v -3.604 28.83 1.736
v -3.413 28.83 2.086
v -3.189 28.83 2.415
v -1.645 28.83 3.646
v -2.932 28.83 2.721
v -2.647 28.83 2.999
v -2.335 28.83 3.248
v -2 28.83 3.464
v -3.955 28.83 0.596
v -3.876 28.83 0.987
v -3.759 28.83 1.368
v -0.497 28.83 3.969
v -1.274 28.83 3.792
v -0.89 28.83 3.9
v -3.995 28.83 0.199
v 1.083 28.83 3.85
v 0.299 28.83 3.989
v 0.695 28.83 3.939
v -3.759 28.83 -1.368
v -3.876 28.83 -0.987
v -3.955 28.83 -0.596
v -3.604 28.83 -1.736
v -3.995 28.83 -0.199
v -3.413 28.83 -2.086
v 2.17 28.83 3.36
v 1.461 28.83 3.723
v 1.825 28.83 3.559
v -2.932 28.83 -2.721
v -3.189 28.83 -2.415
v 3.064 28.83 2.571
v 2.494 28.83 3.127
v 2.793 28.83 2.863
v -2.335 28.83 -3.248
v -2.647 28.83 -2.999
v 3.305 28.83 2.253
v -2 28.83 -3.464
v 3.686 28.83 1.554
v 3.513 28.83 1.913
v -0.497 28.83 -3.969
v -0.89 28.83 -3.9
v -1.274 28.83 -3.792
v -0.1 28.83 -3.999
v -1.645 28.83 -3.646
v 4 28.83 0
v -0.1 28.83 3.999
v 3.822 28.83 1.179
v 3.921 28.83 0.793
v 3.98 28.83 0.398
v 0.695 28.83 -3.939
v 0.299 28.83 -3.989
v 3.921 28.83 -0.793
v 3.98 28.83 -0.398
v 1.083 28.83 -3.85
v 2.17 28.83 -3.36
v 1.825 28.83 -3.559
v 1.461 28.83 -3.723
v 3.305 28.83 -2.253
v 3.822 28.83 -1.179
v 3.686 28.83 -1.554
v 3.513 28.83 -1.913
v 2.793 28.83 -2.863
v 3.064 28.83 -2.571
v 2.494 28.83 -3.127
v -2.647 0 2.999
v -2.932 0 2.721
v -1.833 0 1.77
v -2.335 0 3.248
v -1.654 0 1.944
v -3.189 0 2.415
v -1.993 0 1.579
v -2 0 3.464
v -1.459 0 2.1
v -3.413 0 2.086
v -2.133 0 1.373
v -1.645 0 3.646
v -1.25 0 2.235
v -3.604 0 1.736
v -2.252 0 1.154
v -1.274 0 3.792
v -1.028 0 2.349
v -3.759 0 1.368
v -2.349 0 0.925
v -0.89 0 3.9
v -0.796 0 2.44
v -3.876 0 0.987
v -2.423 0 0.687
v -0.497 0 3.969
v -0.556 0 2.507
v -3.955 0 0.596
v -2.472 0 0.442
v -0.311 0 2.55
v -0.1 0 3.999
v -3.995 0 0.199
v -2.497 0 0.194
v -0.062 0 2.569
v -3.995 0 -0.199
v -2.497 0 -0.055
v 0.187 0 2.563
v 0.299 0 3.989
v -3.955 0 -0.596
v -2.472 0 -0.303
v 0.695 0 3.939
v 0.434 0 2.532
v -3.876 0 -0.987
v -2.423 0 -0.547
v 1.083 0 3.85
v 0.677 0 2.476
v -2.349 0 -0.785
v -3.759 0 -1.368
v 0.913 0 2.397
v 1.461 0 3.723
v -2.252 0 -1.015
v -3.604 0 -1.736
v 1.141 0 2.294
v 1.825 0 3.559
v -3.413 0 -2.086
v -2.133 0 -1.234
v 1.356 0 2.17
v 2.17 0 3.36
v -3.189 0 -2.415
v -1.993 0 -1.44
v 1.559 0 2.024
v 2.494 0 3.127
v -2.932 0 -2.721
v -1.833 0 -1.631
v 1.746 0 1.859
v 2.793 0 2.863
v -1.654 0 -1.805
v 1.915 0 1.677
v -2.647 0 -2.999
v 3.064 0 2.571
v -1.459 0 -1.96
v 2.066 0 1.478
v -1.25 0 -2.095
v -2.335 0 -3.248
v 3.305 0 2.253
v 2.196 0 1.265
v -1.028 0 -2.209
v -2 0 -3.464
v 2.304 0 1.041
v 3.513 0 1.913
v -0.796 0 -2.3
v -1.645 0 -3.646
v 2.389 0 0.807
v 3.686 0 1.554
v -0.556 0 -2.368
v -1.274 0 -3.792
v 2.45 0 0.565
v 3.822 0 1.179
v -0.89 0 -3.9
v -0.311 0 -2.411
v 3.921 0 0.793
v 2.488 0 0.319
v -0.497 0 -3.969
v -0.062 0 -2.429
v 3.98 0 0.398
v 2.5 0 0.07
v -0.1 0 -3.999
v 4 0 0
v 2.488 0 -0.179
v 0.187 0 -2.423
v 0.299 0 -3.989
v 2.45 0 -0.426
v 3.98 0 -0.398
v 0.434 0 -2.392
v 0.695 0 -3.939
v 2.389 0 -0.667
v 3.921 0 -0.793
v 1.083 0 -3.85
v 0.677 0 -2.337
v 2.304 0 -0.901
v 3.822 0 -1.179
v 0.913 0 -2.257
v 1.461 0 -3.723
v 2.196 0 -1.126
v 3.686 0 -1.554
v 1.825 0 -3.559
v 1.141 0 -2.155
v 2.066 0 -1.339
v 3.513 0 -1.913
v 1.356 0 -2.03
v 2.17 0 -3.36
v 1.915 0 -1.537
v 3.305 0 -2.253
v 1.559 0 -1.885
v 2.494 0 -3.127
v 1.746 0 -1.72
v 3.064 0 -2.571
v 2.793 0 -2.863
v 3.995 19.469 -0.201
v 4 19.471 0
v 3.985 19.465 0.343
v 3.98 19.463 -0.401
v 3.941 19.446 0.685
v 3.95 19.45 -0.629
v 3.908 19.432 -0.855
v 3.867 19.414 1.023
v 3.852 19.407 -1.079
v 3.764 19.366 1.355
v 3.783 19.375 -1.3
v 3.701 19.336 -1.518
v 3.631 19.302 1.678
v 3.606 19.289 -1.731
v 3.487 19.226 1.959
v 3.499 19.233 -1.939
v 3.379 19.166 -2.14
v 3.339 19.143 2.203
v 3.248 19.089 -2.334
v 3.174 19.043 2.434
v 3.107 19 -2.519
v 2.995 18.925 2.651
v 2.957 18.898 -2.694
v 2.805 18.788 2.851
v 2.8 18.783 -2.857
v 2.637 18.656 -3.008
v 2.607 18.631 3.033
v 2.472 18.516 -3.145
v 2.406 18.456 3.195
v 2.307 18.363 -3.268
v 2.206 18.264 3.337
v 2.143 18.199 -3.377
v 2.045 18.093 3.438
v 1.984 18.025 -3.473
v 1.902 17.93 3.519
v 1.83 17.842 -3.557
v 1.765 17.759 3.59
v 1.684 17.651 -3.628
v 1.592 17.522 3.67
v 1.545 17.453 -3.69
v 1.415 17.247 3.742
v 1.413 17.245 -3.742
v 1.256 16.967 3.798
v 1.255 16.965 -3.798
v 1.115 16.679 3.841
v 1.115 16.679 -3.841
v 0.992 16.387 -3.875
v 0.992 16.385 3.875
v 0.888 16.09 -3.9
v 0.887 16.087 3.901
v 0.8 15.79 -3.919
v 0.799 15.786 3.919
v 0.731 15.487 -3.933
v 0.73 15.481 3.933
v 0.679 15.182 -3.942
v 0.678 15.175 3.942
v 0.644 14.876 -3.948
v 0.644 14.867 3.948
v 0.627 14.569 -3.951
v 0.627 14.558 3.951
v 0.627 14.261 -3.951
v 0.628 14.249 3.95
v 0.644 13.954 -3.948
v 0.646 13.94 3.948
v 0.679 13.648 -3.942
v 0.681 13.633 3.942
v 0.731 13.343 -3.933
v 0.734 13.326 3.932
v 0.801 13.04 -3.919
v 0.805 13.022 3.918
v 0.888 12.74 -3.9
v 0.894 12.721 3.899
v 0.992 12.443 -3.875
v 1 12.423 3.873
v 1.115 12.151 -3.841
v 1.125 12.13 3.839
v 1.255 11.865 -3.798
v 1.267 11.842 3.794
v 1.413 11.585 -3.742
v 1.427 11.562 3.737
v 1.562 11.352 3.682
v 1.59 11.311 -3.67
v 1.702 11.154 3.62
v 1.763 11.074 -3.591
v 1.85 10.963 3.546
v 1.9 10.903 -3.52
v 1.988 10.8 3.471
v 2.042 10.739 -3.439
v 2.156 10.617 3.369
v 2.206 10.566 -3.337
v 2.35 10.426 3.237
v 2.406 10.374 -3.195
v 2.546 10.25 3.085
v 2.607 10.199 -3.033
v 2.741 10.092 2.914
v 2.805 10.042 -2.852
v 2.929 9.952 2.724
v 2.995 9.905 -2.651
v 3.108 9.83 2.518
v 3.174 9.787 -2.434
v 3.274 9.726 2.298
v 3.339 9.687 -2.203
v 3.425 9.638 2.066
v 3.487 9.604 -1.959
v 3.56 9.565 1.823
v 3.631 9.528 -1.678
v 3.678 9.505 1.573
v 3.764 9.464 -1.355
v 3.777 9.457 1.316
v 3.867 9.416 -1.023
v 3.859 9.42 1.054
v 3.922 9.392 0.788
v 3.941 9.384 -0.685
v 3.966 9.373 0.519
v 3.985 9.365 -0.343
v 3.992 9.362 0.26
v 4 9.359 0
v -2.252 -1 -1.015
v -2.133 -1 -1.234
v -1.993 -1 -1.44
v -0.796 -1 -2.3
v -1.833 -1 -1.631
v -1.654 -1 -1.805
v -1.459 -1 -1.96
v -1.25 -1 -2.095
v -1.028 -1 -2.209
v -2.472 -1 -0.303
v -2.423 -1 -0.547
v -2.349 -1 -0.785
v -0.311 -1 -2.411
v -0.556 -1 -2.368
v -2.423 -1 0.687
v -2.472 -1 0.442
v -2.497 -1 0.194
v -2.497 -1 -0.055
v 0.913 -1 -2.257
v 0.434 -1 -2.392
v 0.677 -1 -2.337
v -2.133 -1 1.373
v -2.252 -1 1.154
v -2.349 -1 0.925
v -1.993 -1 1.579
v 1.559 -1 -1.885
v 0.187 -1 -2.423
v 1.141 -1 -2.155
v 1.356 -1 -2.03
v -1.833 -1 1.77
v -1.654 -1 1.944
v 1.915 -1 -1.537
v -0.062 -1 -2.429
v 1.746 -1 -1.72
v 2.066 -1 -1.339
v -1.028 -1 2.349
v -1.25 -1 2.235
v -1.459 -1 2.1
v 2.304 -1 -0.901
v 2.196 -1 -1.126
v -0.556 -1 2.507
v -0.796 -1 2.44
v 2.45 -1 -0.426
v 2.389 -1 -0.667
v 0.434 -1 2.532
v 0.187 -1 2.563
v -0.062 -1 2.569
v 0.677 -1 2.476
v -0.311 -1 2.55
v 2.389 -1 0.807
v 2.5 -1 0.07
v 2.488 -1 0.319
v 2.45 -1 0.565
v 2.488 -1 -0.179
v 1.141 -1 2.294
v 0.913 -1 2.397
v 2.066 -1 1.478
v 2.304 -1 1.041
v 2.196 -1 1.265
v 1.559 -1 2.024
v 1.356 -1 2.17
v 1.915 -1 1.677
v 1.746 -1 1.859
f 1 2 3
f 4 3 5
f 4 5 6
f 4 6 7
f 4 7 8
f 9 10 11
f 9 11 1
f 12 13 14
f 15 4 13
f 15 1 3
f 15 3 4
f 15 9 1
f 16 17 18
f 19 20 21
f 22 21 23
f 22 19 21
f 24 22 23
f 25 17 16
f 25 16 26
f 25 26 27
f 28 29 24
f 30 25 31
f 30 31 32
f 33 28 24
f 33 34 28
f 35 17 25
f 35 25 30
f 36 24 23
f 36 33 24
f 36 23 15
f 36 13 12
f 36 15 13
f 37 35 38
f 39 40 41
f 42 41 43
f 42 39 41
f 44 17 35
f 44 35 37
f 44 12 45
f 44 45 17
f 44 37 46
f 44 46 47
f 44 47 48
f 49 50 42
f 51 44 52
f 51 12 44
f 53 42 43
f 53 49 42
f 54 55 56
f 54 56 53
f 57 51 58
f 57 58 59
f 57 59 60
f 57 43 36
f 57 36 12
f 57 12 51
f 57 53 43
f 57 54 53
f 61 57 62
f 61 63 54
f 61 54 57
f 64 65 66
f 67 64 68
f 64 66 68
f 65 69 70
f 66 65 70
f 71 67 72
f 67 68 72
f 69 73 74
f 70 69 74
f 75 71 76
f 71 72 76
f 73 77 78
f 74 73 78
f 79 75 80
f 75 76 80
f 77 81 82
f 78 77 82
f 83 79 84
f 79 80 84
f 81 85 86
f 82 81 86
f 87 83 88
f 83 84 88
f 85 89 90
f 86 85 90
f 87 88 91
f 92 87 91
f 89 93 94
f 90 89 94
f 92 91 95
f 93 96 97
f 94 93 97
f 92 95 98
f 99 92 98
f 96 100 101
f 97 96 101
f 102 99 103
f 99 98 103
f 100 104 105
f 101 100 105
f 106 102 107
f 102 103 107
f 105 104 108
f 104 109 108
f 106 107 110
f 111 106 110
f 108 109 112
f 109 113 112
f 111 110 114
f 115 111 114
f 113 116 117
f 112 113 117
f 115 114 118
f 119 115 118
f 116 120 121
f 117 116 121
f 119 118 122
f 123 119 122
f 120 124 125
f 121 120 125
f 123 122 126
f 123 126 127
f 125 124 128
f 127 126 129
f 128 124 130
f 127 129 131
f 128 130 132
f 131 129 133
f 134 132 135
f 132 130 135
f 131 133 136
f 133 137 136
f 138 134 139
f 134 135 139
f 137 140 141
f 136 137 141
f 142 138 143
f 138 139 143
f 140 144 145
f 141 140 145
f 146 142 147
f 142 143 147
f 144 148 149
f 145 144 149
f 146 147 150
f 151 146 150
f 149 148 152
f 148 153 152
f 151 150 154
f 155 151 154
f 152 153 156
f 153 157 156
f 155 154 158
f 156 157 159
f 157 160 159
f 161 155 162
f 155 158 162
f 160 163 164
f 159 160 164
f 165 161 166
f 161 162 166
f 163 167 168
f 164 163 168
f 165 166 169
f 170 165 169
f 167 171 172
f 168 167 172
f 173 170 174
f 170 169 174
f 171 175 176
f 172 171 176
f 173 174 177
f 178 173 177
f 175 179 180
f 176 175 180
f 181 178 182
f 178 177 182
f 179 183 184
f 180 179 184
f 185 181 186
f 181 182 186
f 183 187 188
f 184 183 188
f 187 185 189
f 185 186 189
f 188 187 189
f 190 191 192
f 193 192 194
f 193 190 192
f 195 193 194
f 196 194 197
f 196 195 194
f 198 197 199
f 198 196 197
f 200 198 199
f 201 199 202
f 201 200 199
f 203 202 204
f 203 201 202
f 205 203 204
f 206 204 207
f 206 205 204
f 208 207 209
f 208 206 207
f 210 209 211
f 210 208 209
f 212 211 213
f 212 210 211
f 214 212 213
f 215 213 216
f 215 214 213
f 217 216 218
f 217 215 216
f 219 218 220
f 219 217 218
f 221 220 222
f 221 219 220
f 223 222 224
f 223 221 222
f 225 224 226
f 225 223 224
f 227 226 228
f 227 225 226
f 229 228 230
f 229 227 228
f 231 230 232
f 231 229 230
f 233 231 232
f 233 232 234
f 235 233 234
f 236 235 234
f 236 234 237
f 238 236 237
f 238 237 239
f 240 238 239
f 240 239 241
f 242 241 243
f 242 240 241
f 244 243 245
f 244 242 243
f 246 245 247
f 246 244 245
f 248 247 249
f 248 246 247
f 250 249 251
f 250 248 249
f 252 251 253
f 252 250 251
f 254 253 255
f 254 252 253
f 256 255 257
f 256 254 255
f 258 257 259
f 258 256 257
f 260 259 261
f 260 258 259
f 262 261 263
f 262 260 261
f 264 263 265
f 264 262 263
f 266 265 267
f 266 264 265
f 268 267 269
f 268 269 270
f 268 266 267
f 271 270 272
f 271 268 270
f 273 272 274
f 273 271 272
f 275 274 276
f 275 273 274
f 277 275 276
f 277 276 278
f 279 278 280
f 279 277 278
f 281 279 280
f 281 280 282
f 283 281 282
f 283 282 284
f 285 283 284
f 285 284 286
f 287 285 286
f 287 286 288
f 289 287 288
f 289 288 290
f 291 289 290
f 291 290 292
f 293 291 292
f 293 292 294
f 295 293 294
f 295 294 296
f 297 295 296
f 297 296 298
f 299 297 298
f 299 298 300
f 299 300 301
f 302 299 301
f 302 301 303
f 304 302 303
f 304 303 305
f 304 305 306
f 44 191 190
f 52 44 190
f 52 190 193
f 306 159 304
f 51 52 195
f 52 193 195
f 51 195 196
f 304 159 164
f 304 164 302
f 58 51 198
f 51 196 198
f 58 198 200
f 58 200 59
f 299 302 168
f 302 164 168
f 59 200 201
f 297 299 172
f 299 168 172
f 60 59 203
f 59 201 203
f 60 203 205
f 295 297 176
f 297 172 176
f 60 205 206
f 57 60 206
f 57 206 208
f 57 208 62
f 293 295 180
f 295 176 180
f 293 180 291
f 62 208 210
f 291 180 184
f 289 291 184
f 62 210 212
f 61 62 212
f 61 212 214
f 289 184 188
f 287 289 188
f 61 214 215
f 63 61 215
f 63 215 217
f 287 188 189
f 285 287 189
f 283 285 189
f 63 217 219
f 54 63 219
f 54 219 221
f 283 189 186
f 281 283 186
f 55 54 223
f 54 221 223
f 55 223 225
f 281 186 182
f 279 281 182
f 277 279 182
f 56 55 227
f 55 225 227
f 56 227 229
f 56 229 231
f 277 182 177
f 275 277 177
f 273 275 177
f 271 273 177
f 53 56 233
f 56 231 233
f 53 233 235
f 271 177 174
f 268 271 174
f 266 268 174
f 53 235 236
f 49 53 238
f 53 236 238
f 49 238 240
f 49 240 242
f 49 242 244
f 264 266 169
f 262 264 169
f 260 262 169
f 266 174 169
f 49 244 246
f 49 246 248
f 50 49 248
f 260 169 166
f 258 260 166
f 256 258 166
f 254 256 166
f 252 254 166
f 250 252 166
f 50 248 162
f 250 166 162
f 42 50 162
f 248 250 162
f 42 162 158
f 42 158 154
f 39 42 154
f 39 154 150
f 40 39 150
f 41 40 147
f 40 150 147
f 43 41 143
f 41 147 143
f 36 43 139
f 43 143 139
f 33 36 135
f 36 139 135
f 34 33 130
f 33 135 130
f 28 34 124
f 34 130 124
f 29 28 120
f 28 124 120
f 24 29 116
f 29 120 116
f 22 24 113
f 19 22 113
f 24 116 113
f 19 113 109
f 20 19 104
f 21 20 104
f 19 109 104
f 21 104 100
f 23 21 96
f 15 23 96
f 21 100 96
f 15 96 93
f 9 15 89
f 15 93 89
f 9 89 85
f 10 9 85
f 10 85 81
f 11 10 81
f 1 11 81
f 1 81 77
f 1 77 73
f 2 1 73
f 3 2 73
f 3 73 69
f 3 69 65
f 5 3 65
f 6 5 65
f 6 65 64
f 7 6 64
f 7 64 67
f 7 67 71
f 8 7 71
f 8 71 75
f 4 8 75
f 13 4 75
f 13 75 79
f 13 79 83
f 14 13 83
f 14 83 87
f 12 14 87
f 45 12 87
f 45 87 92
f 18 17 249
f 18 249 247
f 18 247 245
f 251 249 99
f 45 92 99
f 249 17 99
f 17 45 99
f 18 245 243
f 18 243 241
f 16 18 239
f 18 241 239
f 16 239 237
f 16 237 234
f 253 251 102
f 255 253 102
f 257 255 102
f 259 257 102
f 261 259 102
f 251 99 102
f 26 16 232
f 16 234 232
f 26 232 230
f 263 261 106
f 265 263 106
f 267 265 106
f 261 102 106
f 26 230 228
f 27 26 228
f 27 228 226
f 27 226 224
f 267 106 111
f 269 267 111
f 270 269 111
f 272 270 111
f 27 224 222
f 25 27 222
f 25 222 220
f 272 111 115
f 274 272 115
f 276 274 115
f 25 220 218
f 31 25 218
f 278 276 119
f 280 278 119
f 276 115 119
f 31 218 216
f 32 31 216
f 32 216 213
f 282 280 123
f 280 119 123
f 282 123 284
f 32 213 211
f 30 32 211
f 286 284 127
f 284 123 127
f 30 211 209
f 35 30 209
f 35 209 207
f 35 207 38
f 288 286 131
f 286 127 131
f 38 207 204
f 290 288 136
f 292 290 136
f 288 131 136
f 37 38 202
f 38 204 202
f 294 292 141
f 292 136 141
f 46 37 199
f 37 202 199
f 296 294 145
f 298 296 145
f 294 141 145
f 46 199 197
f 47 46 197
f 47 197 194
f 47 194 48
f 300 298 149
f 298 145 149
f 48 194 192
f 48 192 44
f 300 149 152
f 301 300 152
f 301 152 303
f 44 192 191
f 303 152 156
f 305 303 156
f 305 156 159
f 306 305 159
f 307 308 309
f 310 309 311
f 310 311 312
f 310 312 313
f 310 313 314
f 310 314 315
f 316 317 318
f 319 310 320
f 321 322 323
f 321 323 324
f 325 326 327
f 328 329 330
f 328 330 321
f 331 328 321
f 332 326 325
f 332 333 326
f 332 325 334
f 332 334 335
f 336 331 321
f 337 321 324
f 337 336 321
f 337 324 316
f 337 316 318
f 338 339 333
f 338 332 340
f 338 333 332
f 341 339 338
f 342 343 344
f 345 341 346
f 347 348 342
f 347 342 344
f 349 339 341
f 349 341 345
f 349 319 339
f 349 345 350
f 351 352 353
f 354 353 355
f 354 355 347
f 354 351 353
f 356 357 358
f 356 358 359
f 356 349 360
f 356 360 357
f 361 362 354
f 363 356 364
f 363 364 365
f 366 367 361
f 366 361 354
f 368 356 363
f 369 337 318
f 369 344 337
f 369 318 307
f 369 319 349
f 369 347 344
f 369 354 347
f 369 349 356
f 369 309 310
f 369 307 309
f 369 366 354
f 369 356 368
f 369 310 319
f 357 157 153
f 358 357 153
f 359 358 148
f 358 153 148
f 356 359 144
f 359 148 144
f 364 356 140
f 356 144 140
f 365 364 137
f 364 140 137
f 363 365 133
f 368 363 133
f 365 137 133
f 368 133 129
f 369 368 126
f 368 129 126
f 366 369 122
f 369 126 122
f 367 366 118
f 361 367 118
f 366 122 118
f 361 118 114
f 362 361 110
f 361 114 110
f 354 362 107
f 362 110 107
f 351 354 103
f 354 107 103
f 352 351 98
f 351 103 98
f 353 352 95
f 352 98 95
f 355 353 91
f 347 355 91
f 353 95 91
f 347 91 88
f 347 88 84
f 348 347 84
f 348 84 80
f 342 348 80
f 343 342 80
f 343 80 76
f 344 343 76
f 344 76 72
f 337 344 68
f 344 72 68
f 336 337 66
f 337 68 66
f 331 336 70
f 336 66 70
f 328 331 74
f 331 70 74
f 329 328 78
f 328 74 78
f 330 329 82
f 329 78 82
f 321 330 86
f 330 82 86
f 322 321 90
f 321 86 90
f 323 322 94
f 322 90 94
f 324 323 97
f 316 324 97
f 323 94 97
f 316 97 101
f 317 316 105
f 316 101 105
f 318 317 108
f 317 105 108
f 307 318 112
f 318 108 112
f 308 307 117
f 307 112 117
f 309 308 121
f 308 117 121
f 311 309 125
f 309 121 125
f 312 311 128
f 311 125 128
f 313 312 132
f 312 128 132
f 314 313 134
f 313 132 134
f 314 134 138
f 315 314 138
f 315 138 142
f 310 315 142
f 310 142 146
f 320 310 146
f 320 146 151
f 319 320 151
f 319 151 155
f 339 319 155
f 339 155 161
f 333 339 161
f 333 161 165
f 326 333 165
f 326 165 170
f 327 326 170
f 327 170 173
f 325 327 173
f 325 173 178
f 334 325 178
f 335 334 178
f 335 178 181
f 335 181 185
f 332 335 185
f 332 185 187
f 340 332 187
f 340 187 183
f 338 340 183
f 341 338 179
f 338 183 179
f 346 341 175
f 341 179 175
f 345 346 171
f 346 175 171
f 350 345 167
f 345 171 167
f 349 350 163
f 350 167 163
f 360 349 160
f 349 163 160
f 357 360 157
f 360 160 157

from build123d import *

# Parameters (mm, degrees)
SKETCH1_R               = 4
BOSS_EXTRUDE1_DEPTH     = 28.83
SKETCH2_R               = 5.475
CUT_EXTRUDE1_DEPTH      = 5
CUT_EXTRUDE1_DEPTH_BACK = 5
SKETCH3_R               = 2.5
BOSS_EXTRUDE2_DEPTH     = 1


with BuildPart() as part:
    # Sketch1 → Boss-Extrude1 (new body)
    with BuildSketch(Plane(origin=(0, 0, 0), x_dir=(1, 0, 0), z_dir=(0, 1, 0))):
        Circle(SKETCH1_R)
    extrude(amount=BOSS_EXTRUDE1_DEPTH)

    # Sketch2 → Cut-Extrude1 (cut, two sides)
    with BuildSketch(Plane.XY) as cut_extrude1_sk:
        with Locations((6.1, 14.415)):
            Circle(SKETCH2_R)
    extrude(amount=CUT_EXTRUDE1_DEPTH, mode=Mode.SUBTRACT)
    extrude(cut_extrude1_sk.sketch, amount=-CUT_EXTRUDE1_DEPTH_BACK, mode=Mode.SUBTRACT)

    # Sketch3 → Boss-Extrude2 (add)
    with BuildSketch(Plane.XZ):
        with Locations((0, 0.069764056)):
            Circle(SKETCH3_R)
    extrude(amount=BOSS_EXTRUDE2_DEPTH)


solid = part.part
